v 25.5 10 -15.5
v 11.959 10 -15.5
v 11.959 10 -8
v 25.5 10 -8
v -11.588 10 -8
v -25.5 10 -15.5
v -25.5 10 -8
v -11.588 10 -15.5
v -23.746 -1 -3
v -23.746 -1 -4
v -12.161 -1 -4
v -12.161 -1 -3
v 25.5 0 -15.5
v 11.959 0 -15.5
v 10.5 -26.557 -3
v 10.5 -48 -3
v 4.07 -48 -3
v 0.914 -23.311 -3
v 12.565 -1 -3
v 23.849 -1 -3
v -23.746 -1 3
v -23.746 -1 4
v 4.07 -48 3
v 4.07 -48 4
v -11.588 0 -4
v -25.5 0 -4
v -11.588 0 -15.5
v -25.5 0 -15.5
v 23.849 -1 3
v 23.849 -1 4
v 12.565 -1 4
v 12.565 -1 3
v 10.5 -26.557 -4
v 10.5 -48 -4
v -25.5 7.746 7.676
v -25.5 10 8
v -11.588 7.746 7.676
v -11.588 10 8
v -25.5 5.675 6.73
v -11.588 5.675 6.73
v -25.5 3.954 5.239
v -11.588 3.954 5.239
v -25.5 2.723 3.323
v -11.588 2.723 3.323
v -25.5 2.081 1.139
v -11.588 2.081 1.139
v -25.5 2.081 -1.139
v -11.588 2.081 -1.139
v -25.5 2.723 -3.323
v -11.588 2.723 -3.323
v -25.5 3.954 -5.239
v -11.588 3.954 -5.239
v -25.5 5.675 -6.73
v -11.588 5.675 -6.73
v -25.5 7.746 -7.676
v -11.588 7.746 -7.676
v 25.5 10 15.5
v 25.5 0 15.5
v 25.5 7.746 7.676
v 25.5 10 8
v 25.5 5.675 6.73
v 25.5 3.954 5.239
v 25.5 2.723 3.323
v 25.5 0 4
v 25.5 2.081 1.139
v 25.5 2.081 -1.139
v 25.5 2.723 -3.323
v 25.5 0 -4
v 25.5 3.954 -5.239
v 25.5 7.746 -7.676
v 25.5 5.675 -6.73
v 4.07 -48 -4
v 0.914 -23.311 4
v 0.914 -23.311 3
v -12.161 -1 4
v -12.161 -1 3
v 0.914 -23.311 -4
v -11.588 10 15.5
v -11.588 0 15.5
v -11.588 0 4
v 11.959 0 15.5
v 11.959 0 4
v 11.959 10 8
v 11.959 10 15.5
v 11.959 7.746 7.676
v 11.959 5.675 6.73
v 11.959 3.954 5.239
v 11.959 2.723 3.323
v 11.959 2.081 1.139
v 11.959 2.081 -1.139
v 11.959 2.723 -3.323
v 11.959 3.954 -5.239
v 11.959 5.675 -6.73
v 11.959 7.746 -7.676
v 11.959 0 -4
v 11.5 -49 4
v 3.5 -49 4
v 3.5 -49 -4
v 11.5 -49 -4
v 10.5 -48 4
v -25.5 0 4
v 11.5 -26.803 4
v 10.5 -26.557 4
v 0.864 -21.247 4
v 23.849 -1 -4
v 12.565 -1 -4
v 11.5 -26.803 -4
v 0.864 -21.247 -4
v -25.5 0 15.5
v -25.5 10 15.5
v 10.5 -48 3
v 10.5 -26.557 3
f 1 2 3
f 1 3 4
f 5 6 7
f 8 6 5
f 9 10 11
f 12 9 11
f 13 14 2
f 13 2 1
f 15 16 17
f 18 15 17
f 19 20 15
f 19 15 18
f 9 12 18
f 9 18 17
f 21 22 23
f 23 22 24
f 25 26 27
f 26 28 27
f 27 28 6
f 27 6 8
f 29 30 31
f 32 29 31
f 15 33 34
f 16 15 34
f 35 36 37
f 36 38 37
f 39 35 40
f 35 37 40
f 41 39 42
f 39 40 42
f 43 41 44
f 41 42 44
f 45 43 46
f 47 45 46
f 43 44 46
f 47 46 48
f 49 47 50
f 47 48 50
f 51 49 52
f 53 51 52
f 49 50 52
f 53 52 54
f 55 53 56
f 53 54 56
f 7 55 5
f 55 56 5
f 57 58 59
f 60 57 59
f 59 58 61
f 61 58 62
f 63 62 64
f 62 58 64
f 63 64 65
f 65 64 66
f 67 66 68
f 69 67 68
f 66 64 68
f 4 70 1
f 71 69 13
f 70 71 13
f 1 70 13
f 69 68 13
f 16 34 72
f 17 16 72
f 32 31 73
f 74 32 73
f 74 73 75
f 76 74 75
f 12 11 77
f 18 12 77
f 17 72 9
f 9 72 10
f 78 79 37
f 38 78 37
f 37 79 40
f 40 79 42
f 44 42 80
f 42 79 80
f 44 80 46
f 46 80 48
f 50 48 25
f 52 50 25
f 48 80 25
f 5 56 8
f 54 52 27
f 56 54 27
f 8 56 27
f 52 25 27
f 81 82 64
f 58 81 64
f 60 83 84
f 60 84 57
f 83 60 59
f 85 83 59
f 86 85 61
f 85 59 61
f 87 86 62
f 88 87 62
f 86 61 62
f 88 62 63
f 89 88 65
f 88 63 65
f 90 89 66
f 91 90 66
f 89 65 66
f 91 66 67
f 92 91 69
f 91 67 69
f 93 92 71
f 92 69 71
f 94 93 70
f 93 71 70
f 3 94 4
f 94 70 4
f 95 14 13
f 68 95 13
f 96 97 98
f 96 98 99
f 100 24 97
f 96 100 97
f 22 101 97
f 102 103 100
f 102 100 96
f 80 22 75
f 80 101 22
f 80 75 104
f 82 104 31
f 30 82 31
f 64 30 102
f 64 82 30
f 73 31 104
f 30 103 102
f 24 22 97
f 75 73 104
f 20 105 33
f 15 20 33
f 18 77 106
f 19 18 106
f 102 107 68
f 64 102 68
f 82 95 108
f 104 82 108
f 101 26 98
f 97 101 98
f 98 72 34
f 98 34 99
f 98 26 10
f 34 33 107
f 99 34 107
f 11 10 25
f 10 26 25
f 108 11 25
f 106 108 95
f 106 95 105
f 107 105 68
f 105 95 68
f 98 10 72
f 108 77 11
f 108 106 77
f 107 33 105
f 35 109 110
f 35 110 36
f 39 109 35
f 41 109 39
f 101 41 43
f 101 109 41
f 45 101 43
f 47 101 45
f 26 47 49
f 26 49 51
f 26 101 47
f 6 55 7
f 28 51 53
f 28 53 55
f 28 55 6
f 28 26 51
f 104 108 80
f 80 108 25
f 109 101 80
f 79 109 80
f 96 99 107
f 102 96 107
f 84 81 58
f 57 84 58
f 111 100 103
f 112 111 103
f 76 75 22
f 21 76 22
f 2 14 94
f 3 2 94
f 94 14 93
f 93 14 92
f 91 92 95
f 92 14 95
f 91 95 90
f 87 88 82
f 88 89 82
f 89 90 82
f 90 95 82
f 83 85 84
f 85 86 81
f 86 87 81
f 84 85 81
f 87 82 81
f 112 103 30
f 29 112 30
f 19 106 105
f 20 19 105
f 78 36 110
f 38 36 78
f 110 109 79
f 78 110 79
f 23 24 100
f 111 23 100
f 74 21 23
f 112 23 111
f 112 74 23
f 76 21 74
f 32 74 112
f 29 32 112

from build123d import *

# Parameters (mm, degrees)
SKETCH_1_W          = 51
SKETCH_1_H          = 31
EXTRUDE_1_DEPTH     = 10
SKETCH_2_R          = 8
CUT_EXTRUDE_1_DEPTH = 51
SKETCH_3_W          = 51
SKETCH_3_H          = 8
EXTRUDE_3_DEPTH     = 49
CUT_EXTRUDE_4_DEPTH = 49
CUT_EXTRUDE_5_DEPTH = 49
CUT_EXTRUDE_6_DEPTH = 1
CUT_EXTRUDE_7_DEPTH = 1


with BuildPart() as part:
    # Эскиз1 → Бобышка-Вытянуть1 (new body)
    with BuildSketch(Plane(origin=(0, 0, 0), x_dir=(1, 0, 0), z_dir=(0, 1, 0))):
        Rectangle(SKETCH_1_W, SKETCH_1_H)
    extrude(amount=EXTRUDE_1_DEPTH)

    # Эскиз2 → Вырез-Вытянуть1 (cut)
    with BuildSketch(Plane(origin=(25.5, 0, 0), x_dir=(0, 0, -1), z_dir=(1, 0, 0))):
        with Locations((0, 10)):
            Circle(SKETCH_2_R)
    extrude(amount=-CUT_EXTRUDE_1_DEPTH, mode=Mode.SUBTRACT)

    # Эскиз3 → Бобышка-Вытянуть3 (add)
    with BuildSketch(Plane.XZ):
        Rectangle(SKETCH_3_W, SKETCH_3_H)
    extrude(amount=EXTRUDE_3_DEPTH)

    # Эскиз4 → Вырез-Вытянуть4 (cut)
    with BuildSketch(Plane(origin=(0, 0, -4), x_dir=(-1, 0, 0), z_dir=(0, 0, -1))):
        Polygon((25.5, -49), (25.5, 0), (-3.5, -49), align=None)
        Polygon((-11.5, -26.802834127), (-25.5, 0), (-25.5, -49), (-11.5, -49), align=None)
        Polygon((11.587587539, 0), (-11.959179604, 0), (-0.863572713, -21.247079042), align=None)
    extrude(amount=-CUT_EXTRUDE_4_DEPTH, mode=Mode.SUBTRACT)

    # Эскиз6 → Вырез-Вытянуть5 (cut)
    with BuildSketch(Plane(origin=(0, 0, 0), x_dir=(-1, 0, 0), z_dir=(0, -1, 0))):
        Polygon((11.587587539, 4), (11.587587539, -15.5), (-11.959179604, -15.5), (-11.959179604, -4), (-11.959179604, 4), (-11.959179604, 15.5), (11.587587539, 15.5), align=None)
    extrude(amount=-CUT_EXTRUDE_5_DEPTH, mode=Mode.SUBTRACT)

    # Эскиз7 → Вырез-Вытянуть6 (cut)
    with BuildSketch(Plane(origin=(0, 0, -4), x_dir=(-1, 0, 0), z_dir=(0, 0, -1))):
        Polygon((23.746151768, -1), (12.160628495, -1), (-0.913951596, -23.310903643), (-12.56510683, -1), (-23.849468801, -1), (-10.5, -26.557399854), (-10.5, -48), (-4.070174763, -48), align=None)
    extrude(amount=-CUT_EXTRUDE_6_DEPTH, mode=Mode.SUBTRACT)

    # Эскиз8 → Вырез-Вытянуть7 (cut)
    with BuildSketch(Plane.XY.offset(4)):
        Polygon((12.56510683, -1), (0.913951596, -23.310903643), (-12.160628495, -1), (-23.746151768, -1), (4.070174763, -48), (10.5, -48), (10.5, -26.557399854), (23.849468801, -1), align=None)
    extrude(amount=-CUT_EXTRUDE_7_DEPTH, mode=Mode.SUBTRACT)


solid = part.part
